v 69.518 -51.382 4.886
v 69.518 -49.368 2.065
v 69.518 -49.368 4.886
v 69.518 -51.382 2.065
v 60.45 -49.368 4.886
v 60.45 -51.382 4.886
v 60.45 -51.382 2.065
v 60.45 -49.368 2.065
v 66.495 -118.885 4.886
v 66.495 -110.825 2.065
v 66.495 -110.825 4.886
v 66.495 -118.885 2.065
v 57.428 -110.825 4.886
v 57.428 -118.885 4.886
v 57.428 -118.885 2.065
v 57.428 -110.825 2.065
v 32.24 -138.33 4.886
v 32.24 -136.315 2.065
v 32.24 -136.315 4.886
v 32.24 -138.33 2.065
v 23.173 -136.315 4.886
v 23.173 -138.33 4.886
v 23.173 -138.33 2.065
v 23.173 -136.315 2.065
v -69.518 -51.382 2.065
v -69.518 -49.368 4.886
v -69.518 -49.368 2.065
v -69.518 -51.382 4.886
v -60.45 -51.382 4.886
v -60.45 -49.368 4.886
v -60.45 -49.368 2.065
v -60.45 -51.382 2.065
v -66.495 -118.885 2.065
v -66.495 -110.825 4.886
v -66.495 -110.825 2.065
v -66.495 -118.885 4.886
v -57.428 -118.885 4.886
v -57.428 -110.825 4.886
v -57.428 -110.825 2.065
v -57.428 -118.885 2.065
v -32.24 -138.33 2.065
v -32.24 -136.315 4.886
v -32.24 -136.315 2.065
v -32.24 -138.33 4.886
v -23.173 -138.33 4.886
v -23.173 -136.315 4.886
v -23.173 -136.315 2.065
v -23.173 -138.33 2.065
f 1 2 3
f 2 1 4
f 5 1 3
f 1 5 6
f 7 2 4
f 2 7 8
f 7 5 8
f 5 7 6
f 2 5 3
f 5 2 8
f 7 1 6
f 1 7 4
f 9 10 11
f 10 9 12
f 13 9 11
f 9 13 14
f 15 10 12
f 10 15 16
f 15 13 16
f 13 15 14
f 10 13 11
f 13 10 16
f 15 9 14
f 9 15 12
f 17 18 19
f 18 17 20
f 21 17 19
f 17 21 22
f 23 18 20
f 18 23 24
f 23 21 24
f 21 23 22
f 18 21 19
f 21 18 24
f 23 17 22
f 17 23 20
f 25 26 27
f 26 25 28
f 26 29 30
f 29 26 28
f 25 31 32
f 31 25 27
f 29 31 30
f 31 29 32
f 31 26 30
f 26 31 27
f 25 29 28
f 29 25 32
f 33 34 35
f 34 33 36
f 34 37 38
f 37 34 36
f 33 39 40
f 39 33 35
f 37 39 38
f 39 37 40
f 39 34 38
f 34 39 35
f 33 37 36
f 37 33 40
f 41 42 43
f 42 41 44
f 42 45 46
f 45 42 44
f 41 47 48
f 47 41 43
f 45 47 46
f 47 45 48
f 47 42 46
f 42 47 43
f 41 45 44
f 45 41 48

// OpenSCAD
plate_h=1.55;
board_h=1.5;
bottom_h=2.05;
bottom_space=3;
side_h=8.5;

tolerance=0.2;
screw_d=2.3;


actual_hole_d=6;
jack_d=7;

fix_scale=1.0075; // The boards are a bit bigger? My priter uncalibrated ?

$fn=30;

module tray(plate_h=plate_h,bottom_h=bottom_h,side_h=side_h,tolerance=tolerance,outline_file="outer_outline.dxf",sides=true,bottom_space=bottom_space) {

  in_offset = sides ? tolerance : bottom_h ;
  difference(){
    linear_extrude(bottom_h+side_h+plate_h)
      offset(r=bottom_h)
        import(outline_file);
    translate([0,0,bottom_h])
      linear_extrude(bottom_h+side_h+plate_h)
        offset(r=in_offset)
          import(outline_file);    
  }
}

module bottom(plate_h=plate_h,bottom_h=bottom_h,side_h=side_h,tolerance=tolerance,outline_file="outer_outline.dxf",holes_file="mount_holes.dxf",sides=true,bottom_space=bottom_space) {
  difference(){
    union(){
      tray(plate_h,bottom_h=bottom_h,side_h=side_h,tolerance=tolerance,outline_file=outline_file,sides=sides,bottom_space=bottom_space);
      linear_extrude(bottom_h+side_h)
        offset(delta=-tolerance/2)
          import(holes_file); // "columns"
      linear_extrude(bottom_h+bottom_space)
        offset(delta=1)
          import(holes_file); // plate rests
    }
    linear_extrude(bottom_h+side_h+1)
      offset(delta=-(actual_hole_d-screw_d)/2)
        import(holes_file); // screw holes
    linear_extrude(bottom_h)
      offset(delta=-0.4)
        import(holes_file); // nut hole
  }
}

module brain_translate(){
  translate([-88.79,-5.7,0])
    children();
}

module brain_bottom(plate_h=plate_h,bottom_h=bottom_h,side_h=side_h,tolerance=tolerance,outline_file="brain_outline.dxf",holes_file="brain_holes.dxf",sides=true,bottom_space=bottom_space){
  brain_translate()
    bottom(plate_h=plate_h,bottom_h=bottom_h,side_h=side_h,tolerance=tolerance,outline_file=outline_file,holes_file=holes_file,sides=sides,bottom_space=bottom_space);
}

module full_bottom(plate_h=plate_h,bottom_h=bottom_h,side_h=side_h,tolerance=tolerance){
  union(){
    difference(){
      bottom(plate_h=plate_h,bottom_h=bottom_h,side_h=side_h,tolerance=tolerance);
      brain_translate()
        linear_extrude(side_h+2*bottom_h+bottom_space)
          import("brain_bigger_outline.dxf");
    }
  }
}

module plate(plate_h=plate_h) {
  linear_extrude(plate_h)
    import("plate_outline.dxf");
}

module cutouts(plate_h=plate_h) {
linear_extrude(plate_h)
  union(){
    import("plate_cutouts.dxf");  
    // For M3 - check if screw head fits!
    //offset(r=-1.45)
    // For M2.5
    offset(r=-1.67)
    // For M2
    //offset(r=-1.86)
      import("mount_holes.dxf");
  }
}

module plate_with_cutouts(plate_h=plate_h){
  difference(){
    plate(plate_h);
    cutouts(plate_h);
  }
}

module plate_sample(plate_h=plate_h){
  intersection(){
    union(){
      translate([40,-195,0])
        rotate([0,0,25])
          cube([65,42,plate_h]);
      translate([81,-169.5,0])
        cube([130,40,plate_h]);
    }

    plate_with_cutouts(plate_h);
  }
}

module brain_bottom_cartridge(usb=false) {
  slider_w=2;
  slider_l=9;
  slider_gap=0.1;
  difference(){
    union(){
      intersection(){
        brain_bottom();
        brain_translate()
          linear_extrude(side_h+2*bottom_h+bottom_space)
            import("brain_bigger_outline.dxf");
      }
      translate([60,-49-slider_w,bottom_h])
        cube([slider_l,slider_w,bottom_space-tolerance]); // top slider rail
      translate([57,-116-slider_w,bottom_h])
        cube([slider_l,slider_w+6,bottom_space-tolerance]); // middle slider rail
      translate([23,-135.3-slider_w,bottom_h])
        cube([slider_l,slider_w,bottom_space-tolerance]); // middle slider rail
    }
    linear_extrude(10)
      offset(delta=1.2)
        import("mount_holes.dxf");
    if(usb)
      translate([40,-80,bottom_h+bottom_space+board_h+0.5])
        cube([20,20,20]);
    translate([41.5,-47.15,bottom_h+side_h-0.5])
      translate([jack_d/2,0,0])
        rotate([90,0,0])
        union(){
          translate([-jack_d/2,0,0])
            cube([jack_d,jack_d,bottom_h]);
          if(usb)
            translate([jack_d/2+2,-jack_d/2+1,0])
              cube([10,10,bottom_h]);
          cylinder(d=jack_d,h=bottom_h);
        }
  }  
}
module all(plate=false,bottom=false,brain=false, right=false, left=false){
  scale([fix_scale,fix_scale,fix_scale]){
      
    if(right){
      if(bottom)
        translate([20,0,0])
          full_bottom();
      if(brain)
        translate([0,0,0])
          brain_bottom_cartridge(usb=true);
      if(plate)
        translate([0,-160,0])
          //sample();
          plate_with_cutouts();

    }
    if(left || !right && !left) // right hand by default
      mirror([1,0,0]){
        if(bottom)
          translate([20,0,0])
            full_bottom();
        if(brain)
          translate([0,0,0])
            brain_bottom_cartridge(usb=false);
        if(plate)
          translate([0,-160,0])
            //sample();
            plate_with_cutouts();

      }  
  }
}

all(brain=true,bottom=true,plate=true,left=true,right=true);

//plate_sample();
//all(brain=true,bottom=true,right=true);
